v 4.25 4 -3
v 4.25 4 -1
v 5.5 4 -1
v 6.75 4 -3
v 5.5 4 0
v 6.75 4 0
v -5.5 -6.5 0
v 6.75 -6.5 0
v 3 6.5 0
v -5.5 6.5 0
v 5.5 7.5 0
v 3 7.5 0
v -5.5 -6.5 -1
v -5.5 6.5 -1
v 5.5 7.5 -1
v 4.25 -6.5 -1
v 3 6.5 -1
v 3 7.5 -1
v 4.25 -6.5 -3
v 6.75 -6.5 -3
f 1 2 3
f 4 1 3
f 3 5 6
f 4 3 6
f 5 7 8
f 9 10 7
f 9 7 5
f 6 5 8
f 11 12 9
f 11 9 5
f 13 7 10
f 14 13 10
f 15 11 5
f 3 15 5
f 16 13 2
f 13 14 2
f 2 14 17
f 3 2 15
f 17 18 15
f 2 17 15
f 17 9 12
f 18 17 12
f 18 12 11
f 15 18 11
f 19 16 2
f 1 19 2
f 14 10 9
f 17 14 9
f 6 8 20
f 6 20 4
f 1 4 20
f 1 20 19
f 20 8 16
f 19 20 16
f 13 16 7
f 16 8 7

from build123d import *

# Parameters (mm, degrees)
BOSS_EXTRUDE1_DEPTH = 1
CUT_EXTRUDE1_DEPTH  = 11.325938214
SKETCH3_W           = 2.5
SKETCH3_H           = 10.5
BOSS_EXTRUDE2_DEPTH = 3


with BuildPart() as part:
    # Sketch1 → Boss-Extrude1 (new body)
    with BuildSketch(Plane.XY):
        Polygon((2.75, 6.75), (-5.75, 6.75), (-5.75, -6.75), (6.75, -6.75), (6.75, 4.25), (5.75, 4.25), (5.75, 7.75), (2.75, 7.75), align=None)
    extrude(amount=-BOSS_EXTRUDE1_DEPTH)

    # Sketch2 → Cut-Extrude1 (cut, through all)
    with BuildSketch(Plane.XY):
        Polygon((6.75, 4.25), (5.75, 4.25), (5.75, 7.75), (2.75, 7.75), (2.75, 6.75), (-5.75, 6.75), (-5.75, -6.75), (6.75, -6.75), (6.75, -6.5), (6.5, -6.5), (-5.5, -6.5), (-5.5, 6.5), (3, 6.5), (3, 7.5), (5.5, 7.5), (5.5, 4), (6.5, 4), (6.75, 4), align=None)
    extrude(amount=-CUT_EXTRUDE1_DEPTH, mode=Mode.SUBTRACT)

    # Sketch3 → Boss-Extrude2 (add)
    with BuildSketch(Plane(origin=(0, 0, 0), x_dir=(-1, 0, 0), z_dir=(0, 0, -1))):
        with Locations((-5.5, -1.25)):
            Rectangle(SKETCH3_W, SKETCH3_H)
    extrude(amount=BOSS_EXTRUDE2_DEPTH)


solid = part.part
